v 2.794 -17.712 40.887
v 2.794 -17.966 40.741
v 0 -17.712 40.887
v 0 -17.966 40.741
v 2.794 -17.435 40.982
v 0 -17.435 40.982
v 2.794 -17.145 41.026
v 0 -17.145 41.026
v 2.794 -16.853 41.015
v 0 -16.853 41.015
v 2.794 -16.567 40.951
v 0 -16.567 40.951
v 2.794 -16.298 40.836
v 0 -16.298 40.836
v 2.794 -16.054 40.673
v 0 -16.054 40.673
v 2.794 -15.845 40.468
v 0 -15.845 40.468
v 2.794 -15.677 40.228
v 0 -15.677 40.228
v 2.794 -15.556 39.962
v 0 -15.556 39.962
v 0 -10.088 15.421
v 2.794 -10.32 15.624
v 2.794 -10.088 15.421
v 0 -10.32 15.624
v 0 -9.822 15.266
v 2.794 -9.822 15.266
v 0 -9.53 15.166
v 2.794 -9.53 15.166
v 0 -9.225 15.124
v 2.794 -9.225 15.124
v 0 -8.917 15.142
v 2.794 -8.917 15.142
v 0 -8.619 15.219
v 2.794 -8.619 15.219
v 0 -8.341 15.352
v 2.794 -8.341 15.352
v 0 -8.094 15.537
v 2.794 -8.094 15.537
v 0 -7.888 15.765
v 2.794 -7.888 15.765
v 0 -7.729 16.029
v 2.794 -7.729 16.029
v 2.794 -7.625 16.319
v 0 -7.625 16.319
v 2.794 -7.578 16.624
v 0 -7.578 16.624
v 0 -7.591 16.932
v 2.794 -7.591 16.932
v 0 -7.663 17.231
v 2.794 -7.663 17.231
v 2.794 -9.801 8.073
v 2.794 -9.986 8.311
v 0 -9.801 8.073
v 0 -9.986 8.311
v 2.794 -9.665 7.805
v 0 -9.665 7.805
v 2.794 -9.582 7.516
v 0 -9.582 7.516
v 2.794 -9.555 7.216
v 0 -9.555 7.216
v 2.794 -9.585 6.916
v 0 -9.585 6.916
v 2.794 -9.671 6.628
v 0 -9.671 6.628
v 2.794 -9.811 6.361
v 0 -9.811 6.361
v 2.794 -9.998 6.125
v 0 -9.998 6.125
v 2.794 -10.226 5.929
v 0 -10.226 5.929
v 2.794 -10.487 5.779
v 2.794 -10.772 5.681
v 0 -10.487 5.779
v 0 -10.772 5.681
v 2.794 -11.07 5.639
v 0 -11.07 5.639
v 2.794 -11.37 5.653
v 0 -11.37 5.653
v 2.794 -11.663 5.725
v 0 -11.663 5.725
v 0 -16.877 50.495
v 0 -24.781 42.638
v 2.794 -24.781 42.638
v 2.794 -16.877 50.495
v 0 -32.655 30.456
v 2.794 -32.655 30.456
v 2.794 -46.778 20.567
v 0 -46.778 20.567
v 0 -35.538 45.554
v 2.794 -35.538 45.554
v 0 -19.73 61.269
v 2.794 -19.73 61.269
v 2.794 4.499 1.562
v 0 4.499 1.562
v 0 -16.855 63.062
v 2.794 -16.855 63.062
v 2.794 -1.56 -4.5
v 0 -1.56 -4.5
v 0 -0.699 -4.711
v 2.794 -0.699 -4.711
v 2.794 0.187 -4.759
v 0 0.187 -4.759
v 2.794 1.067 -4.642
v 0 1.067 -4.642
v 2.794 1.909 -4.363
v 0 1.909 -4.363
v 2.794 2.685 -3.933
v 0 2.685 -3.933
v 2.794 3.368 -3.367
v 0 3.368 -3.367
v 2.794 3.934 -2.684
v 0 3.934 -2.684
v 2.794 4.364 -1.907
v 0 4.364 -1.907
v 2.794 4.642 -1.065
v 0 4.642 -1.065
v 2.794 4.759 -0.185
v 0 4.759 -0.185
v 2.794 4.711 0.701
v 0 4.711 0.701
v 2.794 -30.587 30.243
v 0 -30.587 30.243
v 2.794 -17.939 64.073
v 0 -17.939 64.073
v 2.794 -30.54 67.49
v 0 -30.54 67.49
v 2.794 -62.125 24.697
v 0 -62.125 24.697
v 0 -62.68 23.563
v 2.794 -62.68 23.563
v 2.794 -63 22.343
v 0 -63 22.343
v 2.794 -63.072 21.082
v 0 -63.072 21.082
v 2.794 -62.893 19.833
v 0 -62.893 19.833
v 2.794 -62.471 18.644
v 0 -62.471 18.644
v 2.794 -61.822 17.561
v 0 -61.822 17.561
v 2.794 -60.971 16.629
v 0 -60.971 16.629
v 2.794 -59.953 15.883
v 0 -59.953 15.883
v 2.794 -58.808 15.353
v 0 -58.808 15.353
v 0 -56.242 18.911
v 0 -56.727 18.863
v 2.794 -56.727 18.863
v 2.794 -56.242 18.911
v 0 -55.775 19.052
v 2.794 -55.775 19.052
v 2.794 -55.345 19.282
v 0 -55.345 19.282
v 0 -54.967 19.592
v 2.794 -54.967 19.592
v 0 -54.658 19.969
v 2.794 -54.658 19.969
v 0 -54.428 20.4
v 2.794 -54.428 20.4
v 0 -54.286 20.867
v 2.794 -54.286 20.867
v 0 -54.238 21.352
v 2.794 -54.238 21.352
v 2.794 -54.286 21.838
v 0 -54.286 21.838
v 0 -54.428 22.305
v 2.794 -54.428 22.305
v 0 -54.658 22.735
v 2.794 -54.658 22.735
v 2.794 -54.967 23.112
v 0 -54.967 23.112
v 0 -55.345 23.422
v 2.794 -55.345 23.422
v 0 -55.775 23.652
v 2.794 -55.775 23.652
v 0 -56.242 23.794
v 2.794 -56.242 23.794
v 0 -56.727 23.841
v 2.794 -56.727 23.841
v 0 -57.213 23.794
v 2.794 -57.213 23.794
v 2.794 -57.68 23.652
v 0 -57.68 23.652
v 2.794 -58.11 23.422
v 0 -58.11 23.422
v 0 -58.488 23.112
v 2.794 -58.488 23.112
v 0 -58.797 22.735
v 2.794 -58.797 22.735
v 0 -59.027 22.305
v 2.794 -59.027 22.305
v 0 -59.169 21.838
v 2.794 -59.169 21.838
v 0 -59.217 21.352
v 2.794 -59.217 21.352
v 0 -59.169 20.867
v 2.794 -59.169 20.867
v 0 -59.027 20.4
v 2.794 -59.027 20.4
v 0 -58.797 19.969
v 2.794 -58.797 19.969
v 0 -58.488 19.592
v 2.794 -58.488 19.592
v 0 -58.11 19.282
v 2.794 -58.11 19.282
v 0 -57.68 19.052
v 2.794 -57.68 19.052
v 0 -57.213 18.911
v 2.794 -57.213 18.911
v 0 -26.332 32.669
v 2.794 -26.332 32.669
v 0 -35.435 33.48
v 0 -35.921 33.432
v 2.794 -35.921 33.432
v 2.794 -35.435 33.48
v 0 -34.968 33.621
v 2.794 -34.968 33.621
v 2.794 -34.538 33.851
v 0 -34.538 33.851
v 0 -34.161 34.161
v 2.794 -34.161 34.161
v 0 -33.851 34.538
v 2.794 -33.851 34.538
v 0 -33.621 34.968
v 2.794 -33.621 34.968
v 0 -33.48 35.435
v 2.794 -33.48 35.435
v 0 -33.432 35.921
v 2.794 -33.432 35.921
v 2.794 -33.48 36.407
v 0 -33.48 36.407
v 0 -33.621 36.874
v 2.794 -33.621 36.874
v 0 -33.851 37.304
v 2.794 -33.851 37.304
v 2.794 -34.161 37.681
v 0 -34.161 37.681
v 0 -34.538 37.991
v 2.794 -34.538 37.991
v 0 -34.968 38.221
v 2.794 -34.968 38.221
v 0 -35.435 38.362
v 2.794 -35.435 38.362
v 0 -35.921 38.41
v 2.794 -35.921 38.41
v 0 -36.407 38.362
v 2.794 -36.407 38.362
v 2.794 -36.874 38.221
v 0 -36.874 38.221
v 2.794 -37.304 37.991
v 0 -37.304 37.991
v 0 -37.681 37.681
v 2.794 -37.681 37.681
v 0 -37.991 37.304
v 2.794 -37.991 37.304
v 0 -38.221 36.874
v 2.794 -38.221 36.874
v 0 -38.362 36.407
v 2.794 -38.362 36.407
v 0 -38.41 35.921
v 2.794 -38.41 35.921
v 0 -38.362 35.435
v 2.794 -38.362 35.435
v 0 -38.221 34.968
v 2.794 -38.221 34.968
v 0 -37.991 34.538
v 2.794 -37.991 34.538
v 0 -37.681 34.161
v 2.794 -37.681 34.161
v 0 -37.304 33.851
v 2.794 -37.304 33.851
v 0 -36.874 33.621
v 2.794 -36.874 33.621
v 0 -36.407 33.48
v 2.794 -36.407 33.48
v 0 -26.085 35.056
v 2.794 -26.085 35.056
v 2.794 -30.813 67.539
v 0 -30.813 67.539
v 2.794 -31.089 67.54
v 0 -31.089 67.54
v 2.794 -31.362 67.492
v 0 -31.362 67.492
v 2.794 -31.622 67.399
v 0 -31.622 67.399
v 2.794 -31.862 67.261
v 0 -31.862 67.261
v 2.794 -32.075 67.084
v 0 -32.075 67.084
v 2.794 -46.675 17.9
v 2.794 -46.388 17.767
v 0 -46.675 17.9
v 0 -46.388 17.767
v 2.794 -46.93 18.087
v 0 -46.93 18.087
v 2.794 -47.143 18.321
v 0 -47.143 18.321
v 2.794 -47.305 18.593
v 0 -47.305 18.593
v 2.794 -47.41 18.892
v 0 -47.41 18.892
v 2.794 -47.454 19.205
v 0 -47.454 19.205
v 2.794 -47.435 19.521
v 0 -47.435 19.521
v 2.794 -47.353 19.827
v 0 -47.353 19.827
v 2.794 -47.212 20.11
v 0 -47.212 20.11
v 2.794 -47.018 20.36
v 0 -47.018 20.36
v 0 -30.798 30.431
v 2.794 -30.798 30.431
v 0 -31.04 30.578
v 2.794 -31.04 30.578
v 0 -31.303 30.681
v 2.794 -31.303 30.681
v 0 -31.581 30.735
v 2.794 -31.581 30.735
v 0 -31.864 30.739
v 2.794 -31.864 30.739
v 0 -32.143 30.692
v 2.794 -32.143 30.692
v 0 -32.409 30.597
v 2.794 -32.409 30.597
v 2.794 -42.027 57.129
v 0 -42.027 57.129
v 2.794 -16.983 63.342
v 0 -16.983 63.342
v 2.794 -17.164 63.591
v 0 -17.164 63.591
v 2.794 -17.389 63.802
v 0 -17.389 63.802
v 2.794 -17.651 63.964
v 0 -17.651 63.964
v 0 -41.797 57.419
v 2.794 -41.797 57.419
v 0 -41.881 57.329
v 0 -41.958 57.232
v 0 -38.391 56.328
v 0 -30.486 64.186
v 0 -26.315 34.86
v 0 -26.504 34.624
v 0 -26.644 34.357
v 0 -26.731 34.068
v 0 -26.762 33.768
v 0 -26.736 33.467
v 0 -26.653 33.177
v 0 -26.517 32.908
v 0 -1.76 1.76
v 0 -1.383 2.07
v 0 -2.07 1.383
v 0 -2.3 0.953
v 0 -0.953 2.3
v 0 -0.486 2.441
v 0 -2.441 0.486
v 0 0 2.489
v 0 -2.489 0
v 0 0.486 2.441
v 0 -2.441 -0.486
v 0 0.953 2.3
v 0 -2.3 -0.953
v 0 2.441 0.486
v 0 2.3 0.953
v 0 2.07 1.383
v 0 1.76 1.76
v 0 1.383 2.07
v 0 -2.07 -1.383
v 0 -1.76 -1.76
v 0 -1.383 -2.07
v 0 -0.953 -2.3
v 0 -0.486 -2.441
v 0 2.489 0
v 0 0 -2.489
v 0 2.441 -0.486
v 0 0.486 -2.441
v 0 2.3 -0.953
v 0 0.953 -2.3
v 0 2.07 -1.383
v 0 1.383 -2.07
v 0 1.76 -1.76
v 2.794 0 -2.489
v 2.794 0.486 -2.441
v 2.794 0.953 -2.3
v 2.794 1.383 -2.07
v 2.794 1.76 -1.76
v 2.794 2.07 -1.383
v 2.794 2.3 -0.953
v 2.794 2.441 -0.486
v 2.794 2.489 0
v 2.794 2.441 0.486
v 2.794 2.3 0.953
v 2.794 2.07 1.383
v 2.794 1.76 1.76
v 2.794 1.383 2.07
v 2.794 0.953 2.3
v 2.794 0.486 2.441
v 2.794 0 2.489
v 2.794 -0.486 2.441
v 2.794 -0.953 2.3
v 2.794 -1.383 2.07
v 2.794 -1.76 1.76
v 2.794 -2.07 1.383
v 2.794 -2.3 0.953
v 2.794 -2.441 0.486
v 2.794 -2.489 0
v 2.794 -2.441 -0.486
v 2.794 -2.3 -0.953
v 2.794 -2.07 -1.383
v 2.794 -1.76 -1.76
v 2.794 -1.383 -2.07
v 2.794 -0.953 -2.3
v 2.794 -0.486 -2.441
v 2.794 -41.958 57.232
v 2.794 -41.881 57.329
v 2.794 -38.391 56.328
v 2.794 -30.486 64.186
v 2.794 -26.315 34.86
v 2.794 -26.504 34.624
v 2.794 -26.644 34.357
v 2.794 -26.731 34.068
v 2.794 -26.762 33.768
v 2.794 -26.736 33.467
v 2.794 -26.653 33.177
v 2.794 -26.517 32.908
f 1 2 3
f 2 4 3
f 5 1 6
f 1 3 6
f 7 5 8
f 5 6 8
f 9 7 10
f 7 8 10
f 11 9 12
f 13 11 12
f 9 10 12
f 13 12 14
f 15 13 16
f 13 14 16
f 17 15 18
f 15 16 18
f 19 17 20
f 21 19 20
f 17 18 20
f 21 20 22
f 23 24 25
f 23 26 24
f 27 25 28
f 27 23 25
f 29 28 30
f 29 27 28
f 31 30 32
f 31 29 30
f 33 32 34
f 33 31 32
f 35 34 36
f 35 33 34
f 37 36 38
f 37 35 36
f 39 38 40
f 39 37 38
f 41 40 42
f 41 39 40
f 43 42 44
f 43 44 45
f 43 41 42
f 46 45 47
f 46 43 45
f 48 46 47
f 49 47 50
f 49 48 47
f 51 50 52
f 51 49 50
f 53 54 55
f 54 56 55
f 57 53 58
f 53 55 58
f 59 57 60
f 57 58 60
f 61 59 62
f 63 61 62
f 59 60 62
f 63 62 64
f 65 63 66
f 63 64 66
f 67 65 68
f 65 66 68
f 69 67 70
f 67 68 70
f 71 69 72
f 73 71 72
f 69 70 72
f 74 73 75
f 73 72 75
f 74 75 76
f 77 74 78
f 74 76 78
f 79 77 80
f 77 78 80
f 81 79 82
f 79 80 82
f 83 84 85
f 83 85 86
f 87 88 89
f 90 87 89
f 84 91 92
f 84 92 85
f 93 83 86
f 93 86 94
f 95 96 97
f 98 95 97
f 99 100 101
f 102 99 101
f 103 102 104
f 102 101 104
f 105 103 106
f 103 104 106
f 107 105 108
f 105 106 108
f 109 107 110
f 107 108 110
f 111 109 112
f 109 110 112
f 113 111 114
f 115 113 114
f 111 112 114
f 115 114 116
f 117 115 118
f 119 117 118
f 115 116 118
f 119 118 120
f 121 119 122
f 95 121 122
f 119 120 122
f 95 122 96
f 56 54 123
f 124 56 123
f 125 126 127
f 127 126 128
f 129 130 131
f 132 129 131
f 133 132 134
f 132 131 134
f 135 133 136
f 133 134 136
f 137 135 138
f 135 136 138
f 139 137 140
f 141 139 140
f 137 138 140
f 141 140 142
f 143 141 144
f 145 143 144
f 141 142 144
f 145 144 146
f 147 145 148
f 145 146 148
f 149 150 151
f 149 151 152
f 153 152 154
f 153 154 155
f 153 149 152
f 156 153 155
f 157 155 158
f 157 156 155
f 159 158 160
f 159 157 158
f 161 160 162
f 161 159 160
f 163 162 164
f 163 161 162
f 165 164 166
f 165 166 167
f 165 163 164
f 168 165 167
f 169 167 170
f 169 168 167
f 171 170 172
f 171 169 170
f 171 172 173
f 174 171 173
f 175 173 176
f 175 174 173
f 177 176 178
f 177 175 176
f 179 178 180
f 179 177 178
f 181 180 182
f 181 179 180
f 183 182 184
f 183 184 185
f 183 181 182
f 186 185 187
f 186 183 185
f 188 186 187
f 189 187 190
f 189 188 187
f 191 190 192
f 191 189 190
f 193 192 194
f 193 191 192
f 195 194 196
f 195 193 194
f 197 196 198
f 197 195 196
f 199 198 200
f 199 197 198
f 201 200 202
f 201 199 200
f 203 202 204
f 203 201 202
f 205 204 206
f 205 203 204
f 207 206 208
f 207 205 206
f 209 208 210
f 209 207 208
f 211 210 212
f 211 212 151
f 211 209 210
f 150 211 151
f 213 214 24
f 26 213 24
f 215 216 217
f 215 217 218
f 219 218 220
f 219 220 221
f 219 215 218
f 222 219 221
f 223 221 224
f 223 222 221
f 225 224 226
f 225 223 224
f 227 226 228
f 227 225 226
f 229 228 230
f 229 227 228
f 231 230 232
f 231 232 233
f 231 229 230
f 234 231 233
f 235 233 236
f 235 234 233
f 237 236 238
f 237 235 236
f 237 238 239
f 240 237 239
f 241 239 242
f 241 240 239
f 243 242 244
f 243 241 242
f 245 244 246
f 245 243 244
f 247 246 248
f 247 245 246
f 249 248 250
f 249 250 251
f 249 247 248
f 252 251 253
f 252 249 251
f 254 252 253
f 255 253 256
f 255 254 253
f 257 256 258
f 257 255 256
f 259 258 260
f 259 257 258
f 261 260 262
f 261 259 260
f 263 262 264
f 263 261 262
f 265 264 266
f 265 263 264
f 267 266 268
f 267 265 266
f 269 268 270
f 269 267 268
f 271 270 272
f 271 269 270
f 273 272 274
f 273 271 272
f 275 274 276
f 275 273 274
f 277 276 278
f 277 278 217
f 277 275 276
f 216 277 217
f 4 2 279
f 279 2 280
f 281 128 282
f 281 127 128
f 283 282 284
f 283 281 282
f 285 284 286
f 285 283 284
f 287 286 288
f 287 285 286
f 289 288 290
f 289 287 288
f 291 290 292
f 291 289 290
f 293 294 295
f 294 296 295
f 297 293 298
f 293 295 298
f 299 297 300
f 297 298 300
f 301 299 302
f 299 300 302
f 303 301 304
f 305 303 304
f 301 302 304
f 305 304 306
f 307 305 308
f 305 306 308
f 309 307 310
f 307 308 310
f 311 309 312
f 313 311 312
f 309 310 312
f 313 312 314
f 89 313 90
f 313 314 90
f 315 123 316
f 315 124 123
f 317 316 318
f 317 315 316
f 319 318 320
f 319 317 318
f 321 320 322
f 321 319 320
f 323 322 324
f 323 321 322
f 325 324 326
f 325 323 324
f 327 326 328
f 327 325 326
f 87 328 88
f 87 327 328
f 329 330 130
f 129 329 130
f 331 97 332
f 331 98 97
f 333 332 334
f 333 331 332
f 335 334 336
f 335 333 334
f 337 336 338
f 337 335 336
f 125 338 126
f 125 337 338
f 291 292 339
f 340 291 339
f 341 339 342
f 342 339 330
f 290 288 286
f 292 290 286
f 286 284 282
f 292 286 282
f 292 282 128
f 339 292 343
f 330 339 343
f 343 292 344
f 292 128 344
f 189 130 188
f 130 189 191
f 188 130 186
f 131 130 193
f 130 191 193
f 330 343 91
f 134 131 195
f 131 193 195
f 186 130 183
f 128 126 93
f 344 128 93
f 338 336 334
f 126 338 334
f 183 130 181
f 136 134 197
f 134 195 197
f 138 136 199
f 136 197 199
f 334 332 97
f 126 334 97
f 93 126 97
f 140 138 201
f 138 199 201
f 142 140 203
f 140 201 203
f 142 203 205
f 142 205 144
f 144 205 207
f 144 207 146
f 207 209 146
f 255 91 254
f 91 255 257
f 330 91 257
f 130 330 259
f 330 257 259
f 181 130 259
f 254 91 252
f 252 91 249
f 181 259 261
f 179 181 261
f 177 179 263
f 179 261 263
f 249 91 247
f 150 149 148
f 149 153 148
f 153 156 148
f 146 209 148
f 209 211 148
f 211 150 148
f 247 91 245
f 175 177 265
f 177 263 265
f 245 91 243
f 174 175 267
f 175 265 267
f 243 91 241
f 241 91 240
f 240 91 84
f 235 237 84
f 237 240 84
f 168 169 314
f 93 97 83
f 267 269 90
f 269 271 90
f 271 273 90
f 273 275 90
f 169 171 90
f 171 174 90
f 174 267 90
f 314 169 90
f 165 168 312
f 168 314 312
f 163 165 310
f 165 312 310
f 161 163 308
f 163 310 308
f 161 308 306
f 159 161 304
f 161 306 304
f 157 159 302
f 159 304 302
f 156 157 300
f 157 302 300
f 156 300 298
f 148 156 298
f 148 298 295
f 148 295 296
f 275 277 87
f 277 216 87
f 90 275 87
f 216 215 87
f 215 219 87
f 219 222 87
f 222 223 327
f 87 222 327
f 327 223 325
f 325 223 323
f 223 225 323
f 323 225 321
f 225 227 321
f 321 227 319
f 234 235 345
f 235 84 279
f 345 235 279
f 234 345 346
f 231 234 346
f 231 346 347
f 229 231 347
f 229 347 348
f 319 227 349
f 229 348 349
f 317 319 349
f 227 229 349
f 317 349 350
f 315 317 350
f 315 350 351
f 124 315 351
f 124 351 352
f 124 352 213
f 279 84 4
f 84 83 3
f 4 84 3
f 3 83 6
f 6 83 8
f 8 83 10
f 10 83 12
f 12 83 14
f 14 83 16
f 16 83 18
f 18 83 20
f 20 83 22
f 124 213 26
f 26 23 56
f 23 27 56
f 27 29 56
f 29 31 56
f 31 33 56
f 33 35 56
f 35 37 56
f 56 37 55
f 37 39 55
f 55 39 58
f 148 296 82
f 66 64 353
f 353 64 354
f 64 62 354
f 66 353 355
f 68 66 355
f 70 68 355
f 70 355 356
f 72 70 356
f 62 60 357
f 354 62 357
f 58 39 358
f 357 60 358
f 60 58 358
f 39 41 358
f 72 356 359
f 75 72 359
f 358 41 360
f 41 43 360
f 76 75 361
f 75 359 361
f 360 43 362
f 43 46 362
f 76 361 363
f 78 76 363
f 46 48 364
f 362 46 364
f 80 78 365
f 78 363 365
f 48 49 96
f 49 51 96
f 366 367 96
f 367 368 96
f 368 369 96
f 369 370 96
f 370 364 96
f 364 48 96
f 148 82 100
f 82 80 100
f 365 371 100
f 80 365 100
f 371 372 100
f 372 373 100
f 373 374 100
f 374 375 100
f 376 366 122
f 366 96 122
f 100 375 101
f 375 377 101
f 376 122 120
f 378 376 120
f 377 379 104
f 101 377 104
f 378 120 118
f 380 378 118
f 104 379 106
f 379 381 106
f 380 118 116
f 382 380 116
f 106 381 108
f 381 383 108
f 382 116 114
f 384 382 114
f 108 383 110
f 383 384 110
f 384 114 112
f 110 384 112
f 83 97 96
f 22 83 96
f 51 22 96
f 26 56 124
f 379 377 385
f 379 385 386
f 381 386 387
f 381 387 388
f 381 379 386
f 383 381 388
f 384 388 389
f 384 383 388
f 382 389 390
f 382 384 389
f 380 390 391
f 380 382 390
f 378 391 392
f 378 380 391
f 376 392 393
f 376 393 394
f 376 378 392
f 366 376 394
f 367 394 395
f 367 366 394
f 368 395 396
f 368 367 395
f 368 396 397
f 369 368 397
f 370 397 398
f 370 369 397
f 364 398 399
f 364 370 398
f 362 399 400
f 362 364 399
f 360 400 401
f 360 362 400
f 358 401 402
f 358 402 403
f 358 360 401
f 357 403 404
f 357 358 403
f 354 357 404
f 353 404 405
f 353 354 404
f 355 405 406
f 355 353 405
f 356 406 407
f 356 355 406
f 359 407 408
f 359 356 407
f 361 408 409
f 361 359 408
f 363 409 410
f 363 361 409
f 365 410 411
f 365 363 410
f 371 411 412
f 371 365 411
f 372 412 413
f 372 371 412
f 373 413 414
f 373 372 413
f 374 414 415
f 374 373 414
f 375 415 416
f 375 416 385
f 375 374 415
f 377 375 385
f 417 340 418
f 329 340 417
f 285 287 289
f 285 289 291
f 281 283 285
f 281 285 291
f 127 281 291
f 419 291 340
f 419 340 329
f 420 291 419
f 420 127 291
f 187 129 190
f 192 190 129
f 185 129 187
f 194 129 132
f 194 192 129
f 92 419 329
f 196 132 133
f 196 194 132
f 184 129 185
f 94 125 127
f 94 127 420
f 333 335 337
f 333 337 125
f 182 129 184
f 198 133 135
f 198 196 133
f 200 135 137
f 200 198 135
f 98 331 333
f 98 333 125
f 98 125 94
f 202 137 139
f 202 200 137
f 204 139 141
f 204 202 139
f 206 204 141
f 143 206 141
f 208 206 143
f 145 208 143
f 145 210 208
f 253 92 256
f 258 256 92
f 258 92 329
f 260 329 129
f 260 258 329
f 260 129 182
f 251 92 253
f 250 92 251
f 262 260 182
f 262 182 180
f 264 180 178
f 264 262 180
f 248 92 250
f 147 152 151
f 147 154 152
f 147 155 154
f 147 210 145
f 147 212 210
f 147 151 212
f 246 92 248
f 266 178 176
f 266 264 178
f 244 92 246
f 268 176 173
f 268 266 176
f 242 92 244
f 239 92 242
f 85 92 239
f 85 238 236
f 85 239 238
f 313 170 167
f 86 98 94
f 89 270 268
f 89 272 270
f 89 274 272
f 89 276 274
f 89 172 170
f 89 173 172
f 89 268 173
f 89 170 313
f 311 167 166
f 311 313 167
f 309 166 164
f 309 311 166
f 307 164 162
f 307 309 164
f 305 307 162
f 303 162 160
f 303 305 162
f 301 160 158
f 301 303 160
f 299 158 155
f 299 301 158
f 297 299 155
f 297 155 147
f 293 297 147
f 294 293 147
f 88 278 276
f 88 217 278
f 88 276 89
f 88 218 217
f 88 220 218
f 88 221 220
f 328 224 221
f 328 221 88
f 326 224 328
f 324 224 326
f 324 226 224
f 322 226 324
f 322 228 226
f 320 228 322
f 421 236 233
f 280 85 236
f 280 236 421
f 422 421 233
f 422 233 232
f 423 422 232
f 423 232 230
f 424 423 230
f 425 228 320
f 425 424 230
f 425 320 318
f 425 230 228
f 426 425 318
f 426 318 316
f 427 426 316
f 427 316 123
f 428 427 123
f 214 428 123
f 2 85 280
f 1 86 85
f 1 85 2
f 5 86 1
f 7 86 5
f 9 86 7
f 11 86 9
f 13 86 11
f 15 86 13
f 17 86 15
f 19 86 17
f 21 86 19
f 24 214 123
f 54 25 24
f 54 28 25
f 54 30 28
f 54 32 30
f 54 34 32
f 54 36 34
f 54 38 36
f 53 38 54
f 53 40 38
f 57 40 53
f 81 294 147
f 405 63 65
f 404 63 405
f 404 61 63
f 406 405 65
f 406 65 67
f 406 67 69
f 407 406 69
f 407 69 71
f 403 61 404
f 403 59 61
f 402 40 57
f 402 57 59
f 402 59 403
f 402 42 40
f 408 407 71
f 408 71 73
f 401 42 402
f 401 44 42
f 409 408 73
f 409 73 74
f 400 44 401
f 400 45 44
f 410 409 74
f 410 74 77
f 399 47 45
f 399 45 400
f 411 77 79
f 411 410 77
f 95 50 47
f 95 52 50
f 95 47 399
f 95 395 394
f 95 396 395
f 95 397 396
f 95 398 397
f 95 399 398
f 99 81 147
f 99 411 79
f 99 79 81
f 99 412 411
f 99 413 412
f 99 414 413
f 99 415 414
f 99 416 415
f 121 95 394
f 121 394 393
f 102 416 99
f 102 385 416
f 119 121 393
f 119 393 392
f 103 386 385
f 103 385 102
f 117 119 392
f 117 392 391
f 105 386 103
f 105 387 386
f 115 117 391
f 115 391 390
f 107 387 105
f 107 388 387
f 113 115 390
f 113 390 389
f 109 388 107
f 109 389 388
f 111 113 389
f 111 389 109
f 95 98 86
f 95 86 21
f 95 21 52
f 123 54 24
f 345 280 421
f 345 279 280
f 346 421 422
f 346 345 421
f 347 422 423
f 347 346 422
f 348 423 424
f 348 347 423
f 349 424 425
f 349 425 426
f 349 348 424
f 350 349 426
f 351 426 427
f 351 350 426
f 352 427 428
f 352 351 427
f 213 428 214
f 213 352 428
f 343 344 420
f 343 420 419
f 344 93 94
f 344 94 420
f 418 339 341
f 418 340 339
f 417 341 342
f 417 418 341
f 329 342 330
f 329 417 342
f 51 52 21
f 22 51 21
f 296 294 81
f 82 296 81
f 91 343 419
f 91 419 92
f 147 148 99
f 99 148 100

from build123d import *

# Parameters (mm, degrees)
SKETCH1_R           = 2.4892
BOSS_EXTRUDE1_DEPTH = 2.794
CUT_EXTRUDE1_DEPTH  = 76.982993088
BOSS_EXTRUDE2_START = -2.794
BOSS_EXTRUDE2_DEPTH = 2.794
CUT_EXTRUDE2_DEPTH  = 93.595404272
FILLET1_R           = 1.5875
FILLET2_R           = 1.5875


with BuildPart() as part:
    # Sketch1 → Boss-Extrude1 (new body)
    with BuildSketch(Plane(origin=(0, 0, 0), x_dir=(0, 0, -1), z_dir=(1, 0, 0))):
        with BuildLine():
            Line((-15.352682977, -58.807991027), (4.499625018, -1.560378463))
            ThreePointArc((4.499625018, -1.560378463), (2.590924963, 3.996062323), (-3.260713933, 3.471188686))
            Line((-3.260713933, 3.471188686), (-40.268643062, -31.292772903))
            ThreePointArc((-40.268643062, -31.292772903), (-42.237439845, -35.268799833), (-41.122639966, -39.563234855))
            Line((-41.122639966, -39.563234855), (-26.553798482, -60.36969678))
            ThreePointArc((-26.553798482, -60.36969678), (-20.475321466, -63.016652797), (-15.352682977, -58.807991027))
        make_face()
        Circle(SKETCH1_R, mode=Mode.SUBTRACT)
        with Locations((-35.921024484, -35.921024484)):
            Circle(SKETCH1_R, mode=Mode.SUBTRACT)
        with Locations((-21.352183001, -56.727486409)):
            Circle(SKETCH1_R, mode=Mode.SUBTRACT)
    extrude(amount=BOSS_EXTRUDE1_DEPTH)

    # Sketch2 → Cut-Extrude1 (cut, through all)
    with BuildSketch(Plane(origin=(2.794, 0, 0), x_dir=(0, 0, -1), z_dir=(1, 0, 0))):
        Polygon((-3.612253937, -5.571289043), (-31.24485752, -31.528395862), (-18.784617945, -49.323462173), align=None)
    extrude(amount=-CUT_EXTRUDE1_DEPTH, mode=Mode.SUBTRACT)

    # Sketch3 → Boss-Extrude2 (add)
    with BuildSketch(Plane(origin=(2.794, 0, 0), x_dir=(0, 0, -1), z_dir=(1, 0, 0)).offset(BOSS_EXTRUDE2_START)):
        with BuildLine():
            Line((-1.562121869, 4.499020062), (-63.85396467, -17.129567629))
            Line((-63.85396467, -17.129567629), (-67.729854308, -31.424790078))
            Line((-67.729854308, -31.424790078), (-57.287773334, -41.92902019))
            Line((-57.287773334, -41.92902019), (-24.697034781, -62.125121685))
            ThreePointArc((-24.697034781, -62.125121685), (-25.714625529, -61.341768064), (-26.553798482, -60.36969678))
            Line((-26.553798482, -60.36969678), (-41.122639966, -39.563234855))
            ThreePointArc((-41.122639966, -39.563234855), (-42.237439845, -35.268799833), (-40.268643062, -31.292772903))
            Line((-40.268643062, -31.292772903), (-3.260713933, 3.471188686))
            ThreePointArc((-3.260713933, 3.471188686), (-2.465572069, 4.074599443), (-1.562121869, 4.499020062))
        make_face()
        Polygon((-56.32839471, -38.390598792), (-45.55447623, -35.537970896), (-42.637965216, -24.781169846), (-50.495372681, -16.876996692), (-61.269291162, -19.729624588), (-64.185802176, -30.486425638), align=None, mode=Mode.SUBTRACT)
    extrude(amount=BOSS_EXTRUDE2_DEPTH)

    # Sketch4 → Cut-Extrude2 (cut, through all)
    with BuildSketch(Plane(origin=(2.794, 0, 0), x_dir=(0, 0, -1), z_dir=(1, 0, 0))):
        Polygon((-41.946495802, -16.24487248), (-34.004795616, -27.58679577), (-10.194346511, -5.220087943), align=None)
    extrude(amount=-CUT_EXTRUDE2_DEPTH, mode=Mode.SUBTRACT)

    # Fillet1
    fillet1_edges = [part.edges().sort_by_distance(p)[0] for p in [
        (1.397, -5.571289043, 3.612253937),
        (1.397, -49.323462173, 18.784617945),
        (1.397, -31.528395862, 31.24485752),
    ]]
    fillet(fillet1_edges, radius=FILLET1_R)

    # Fillet2
    fillet2_edges = [part.edges().sort_by_distance(p)[0] for p in [
        (1.397, -17.129567629, 63.85396467),
        (1.397, -31.424790078, 67.729854308),
        (1.397, -41.92902019, 57.287773334),
        (1.397, -16.24487248, 41.946495802),
        (1.397, -5.220087943, 10.194346511),
        (1.397, -27.58679577, 34.004795616),
    ]]
    fillet(fillet2_edges, radius=FILLET2_R)


solid = part.part
